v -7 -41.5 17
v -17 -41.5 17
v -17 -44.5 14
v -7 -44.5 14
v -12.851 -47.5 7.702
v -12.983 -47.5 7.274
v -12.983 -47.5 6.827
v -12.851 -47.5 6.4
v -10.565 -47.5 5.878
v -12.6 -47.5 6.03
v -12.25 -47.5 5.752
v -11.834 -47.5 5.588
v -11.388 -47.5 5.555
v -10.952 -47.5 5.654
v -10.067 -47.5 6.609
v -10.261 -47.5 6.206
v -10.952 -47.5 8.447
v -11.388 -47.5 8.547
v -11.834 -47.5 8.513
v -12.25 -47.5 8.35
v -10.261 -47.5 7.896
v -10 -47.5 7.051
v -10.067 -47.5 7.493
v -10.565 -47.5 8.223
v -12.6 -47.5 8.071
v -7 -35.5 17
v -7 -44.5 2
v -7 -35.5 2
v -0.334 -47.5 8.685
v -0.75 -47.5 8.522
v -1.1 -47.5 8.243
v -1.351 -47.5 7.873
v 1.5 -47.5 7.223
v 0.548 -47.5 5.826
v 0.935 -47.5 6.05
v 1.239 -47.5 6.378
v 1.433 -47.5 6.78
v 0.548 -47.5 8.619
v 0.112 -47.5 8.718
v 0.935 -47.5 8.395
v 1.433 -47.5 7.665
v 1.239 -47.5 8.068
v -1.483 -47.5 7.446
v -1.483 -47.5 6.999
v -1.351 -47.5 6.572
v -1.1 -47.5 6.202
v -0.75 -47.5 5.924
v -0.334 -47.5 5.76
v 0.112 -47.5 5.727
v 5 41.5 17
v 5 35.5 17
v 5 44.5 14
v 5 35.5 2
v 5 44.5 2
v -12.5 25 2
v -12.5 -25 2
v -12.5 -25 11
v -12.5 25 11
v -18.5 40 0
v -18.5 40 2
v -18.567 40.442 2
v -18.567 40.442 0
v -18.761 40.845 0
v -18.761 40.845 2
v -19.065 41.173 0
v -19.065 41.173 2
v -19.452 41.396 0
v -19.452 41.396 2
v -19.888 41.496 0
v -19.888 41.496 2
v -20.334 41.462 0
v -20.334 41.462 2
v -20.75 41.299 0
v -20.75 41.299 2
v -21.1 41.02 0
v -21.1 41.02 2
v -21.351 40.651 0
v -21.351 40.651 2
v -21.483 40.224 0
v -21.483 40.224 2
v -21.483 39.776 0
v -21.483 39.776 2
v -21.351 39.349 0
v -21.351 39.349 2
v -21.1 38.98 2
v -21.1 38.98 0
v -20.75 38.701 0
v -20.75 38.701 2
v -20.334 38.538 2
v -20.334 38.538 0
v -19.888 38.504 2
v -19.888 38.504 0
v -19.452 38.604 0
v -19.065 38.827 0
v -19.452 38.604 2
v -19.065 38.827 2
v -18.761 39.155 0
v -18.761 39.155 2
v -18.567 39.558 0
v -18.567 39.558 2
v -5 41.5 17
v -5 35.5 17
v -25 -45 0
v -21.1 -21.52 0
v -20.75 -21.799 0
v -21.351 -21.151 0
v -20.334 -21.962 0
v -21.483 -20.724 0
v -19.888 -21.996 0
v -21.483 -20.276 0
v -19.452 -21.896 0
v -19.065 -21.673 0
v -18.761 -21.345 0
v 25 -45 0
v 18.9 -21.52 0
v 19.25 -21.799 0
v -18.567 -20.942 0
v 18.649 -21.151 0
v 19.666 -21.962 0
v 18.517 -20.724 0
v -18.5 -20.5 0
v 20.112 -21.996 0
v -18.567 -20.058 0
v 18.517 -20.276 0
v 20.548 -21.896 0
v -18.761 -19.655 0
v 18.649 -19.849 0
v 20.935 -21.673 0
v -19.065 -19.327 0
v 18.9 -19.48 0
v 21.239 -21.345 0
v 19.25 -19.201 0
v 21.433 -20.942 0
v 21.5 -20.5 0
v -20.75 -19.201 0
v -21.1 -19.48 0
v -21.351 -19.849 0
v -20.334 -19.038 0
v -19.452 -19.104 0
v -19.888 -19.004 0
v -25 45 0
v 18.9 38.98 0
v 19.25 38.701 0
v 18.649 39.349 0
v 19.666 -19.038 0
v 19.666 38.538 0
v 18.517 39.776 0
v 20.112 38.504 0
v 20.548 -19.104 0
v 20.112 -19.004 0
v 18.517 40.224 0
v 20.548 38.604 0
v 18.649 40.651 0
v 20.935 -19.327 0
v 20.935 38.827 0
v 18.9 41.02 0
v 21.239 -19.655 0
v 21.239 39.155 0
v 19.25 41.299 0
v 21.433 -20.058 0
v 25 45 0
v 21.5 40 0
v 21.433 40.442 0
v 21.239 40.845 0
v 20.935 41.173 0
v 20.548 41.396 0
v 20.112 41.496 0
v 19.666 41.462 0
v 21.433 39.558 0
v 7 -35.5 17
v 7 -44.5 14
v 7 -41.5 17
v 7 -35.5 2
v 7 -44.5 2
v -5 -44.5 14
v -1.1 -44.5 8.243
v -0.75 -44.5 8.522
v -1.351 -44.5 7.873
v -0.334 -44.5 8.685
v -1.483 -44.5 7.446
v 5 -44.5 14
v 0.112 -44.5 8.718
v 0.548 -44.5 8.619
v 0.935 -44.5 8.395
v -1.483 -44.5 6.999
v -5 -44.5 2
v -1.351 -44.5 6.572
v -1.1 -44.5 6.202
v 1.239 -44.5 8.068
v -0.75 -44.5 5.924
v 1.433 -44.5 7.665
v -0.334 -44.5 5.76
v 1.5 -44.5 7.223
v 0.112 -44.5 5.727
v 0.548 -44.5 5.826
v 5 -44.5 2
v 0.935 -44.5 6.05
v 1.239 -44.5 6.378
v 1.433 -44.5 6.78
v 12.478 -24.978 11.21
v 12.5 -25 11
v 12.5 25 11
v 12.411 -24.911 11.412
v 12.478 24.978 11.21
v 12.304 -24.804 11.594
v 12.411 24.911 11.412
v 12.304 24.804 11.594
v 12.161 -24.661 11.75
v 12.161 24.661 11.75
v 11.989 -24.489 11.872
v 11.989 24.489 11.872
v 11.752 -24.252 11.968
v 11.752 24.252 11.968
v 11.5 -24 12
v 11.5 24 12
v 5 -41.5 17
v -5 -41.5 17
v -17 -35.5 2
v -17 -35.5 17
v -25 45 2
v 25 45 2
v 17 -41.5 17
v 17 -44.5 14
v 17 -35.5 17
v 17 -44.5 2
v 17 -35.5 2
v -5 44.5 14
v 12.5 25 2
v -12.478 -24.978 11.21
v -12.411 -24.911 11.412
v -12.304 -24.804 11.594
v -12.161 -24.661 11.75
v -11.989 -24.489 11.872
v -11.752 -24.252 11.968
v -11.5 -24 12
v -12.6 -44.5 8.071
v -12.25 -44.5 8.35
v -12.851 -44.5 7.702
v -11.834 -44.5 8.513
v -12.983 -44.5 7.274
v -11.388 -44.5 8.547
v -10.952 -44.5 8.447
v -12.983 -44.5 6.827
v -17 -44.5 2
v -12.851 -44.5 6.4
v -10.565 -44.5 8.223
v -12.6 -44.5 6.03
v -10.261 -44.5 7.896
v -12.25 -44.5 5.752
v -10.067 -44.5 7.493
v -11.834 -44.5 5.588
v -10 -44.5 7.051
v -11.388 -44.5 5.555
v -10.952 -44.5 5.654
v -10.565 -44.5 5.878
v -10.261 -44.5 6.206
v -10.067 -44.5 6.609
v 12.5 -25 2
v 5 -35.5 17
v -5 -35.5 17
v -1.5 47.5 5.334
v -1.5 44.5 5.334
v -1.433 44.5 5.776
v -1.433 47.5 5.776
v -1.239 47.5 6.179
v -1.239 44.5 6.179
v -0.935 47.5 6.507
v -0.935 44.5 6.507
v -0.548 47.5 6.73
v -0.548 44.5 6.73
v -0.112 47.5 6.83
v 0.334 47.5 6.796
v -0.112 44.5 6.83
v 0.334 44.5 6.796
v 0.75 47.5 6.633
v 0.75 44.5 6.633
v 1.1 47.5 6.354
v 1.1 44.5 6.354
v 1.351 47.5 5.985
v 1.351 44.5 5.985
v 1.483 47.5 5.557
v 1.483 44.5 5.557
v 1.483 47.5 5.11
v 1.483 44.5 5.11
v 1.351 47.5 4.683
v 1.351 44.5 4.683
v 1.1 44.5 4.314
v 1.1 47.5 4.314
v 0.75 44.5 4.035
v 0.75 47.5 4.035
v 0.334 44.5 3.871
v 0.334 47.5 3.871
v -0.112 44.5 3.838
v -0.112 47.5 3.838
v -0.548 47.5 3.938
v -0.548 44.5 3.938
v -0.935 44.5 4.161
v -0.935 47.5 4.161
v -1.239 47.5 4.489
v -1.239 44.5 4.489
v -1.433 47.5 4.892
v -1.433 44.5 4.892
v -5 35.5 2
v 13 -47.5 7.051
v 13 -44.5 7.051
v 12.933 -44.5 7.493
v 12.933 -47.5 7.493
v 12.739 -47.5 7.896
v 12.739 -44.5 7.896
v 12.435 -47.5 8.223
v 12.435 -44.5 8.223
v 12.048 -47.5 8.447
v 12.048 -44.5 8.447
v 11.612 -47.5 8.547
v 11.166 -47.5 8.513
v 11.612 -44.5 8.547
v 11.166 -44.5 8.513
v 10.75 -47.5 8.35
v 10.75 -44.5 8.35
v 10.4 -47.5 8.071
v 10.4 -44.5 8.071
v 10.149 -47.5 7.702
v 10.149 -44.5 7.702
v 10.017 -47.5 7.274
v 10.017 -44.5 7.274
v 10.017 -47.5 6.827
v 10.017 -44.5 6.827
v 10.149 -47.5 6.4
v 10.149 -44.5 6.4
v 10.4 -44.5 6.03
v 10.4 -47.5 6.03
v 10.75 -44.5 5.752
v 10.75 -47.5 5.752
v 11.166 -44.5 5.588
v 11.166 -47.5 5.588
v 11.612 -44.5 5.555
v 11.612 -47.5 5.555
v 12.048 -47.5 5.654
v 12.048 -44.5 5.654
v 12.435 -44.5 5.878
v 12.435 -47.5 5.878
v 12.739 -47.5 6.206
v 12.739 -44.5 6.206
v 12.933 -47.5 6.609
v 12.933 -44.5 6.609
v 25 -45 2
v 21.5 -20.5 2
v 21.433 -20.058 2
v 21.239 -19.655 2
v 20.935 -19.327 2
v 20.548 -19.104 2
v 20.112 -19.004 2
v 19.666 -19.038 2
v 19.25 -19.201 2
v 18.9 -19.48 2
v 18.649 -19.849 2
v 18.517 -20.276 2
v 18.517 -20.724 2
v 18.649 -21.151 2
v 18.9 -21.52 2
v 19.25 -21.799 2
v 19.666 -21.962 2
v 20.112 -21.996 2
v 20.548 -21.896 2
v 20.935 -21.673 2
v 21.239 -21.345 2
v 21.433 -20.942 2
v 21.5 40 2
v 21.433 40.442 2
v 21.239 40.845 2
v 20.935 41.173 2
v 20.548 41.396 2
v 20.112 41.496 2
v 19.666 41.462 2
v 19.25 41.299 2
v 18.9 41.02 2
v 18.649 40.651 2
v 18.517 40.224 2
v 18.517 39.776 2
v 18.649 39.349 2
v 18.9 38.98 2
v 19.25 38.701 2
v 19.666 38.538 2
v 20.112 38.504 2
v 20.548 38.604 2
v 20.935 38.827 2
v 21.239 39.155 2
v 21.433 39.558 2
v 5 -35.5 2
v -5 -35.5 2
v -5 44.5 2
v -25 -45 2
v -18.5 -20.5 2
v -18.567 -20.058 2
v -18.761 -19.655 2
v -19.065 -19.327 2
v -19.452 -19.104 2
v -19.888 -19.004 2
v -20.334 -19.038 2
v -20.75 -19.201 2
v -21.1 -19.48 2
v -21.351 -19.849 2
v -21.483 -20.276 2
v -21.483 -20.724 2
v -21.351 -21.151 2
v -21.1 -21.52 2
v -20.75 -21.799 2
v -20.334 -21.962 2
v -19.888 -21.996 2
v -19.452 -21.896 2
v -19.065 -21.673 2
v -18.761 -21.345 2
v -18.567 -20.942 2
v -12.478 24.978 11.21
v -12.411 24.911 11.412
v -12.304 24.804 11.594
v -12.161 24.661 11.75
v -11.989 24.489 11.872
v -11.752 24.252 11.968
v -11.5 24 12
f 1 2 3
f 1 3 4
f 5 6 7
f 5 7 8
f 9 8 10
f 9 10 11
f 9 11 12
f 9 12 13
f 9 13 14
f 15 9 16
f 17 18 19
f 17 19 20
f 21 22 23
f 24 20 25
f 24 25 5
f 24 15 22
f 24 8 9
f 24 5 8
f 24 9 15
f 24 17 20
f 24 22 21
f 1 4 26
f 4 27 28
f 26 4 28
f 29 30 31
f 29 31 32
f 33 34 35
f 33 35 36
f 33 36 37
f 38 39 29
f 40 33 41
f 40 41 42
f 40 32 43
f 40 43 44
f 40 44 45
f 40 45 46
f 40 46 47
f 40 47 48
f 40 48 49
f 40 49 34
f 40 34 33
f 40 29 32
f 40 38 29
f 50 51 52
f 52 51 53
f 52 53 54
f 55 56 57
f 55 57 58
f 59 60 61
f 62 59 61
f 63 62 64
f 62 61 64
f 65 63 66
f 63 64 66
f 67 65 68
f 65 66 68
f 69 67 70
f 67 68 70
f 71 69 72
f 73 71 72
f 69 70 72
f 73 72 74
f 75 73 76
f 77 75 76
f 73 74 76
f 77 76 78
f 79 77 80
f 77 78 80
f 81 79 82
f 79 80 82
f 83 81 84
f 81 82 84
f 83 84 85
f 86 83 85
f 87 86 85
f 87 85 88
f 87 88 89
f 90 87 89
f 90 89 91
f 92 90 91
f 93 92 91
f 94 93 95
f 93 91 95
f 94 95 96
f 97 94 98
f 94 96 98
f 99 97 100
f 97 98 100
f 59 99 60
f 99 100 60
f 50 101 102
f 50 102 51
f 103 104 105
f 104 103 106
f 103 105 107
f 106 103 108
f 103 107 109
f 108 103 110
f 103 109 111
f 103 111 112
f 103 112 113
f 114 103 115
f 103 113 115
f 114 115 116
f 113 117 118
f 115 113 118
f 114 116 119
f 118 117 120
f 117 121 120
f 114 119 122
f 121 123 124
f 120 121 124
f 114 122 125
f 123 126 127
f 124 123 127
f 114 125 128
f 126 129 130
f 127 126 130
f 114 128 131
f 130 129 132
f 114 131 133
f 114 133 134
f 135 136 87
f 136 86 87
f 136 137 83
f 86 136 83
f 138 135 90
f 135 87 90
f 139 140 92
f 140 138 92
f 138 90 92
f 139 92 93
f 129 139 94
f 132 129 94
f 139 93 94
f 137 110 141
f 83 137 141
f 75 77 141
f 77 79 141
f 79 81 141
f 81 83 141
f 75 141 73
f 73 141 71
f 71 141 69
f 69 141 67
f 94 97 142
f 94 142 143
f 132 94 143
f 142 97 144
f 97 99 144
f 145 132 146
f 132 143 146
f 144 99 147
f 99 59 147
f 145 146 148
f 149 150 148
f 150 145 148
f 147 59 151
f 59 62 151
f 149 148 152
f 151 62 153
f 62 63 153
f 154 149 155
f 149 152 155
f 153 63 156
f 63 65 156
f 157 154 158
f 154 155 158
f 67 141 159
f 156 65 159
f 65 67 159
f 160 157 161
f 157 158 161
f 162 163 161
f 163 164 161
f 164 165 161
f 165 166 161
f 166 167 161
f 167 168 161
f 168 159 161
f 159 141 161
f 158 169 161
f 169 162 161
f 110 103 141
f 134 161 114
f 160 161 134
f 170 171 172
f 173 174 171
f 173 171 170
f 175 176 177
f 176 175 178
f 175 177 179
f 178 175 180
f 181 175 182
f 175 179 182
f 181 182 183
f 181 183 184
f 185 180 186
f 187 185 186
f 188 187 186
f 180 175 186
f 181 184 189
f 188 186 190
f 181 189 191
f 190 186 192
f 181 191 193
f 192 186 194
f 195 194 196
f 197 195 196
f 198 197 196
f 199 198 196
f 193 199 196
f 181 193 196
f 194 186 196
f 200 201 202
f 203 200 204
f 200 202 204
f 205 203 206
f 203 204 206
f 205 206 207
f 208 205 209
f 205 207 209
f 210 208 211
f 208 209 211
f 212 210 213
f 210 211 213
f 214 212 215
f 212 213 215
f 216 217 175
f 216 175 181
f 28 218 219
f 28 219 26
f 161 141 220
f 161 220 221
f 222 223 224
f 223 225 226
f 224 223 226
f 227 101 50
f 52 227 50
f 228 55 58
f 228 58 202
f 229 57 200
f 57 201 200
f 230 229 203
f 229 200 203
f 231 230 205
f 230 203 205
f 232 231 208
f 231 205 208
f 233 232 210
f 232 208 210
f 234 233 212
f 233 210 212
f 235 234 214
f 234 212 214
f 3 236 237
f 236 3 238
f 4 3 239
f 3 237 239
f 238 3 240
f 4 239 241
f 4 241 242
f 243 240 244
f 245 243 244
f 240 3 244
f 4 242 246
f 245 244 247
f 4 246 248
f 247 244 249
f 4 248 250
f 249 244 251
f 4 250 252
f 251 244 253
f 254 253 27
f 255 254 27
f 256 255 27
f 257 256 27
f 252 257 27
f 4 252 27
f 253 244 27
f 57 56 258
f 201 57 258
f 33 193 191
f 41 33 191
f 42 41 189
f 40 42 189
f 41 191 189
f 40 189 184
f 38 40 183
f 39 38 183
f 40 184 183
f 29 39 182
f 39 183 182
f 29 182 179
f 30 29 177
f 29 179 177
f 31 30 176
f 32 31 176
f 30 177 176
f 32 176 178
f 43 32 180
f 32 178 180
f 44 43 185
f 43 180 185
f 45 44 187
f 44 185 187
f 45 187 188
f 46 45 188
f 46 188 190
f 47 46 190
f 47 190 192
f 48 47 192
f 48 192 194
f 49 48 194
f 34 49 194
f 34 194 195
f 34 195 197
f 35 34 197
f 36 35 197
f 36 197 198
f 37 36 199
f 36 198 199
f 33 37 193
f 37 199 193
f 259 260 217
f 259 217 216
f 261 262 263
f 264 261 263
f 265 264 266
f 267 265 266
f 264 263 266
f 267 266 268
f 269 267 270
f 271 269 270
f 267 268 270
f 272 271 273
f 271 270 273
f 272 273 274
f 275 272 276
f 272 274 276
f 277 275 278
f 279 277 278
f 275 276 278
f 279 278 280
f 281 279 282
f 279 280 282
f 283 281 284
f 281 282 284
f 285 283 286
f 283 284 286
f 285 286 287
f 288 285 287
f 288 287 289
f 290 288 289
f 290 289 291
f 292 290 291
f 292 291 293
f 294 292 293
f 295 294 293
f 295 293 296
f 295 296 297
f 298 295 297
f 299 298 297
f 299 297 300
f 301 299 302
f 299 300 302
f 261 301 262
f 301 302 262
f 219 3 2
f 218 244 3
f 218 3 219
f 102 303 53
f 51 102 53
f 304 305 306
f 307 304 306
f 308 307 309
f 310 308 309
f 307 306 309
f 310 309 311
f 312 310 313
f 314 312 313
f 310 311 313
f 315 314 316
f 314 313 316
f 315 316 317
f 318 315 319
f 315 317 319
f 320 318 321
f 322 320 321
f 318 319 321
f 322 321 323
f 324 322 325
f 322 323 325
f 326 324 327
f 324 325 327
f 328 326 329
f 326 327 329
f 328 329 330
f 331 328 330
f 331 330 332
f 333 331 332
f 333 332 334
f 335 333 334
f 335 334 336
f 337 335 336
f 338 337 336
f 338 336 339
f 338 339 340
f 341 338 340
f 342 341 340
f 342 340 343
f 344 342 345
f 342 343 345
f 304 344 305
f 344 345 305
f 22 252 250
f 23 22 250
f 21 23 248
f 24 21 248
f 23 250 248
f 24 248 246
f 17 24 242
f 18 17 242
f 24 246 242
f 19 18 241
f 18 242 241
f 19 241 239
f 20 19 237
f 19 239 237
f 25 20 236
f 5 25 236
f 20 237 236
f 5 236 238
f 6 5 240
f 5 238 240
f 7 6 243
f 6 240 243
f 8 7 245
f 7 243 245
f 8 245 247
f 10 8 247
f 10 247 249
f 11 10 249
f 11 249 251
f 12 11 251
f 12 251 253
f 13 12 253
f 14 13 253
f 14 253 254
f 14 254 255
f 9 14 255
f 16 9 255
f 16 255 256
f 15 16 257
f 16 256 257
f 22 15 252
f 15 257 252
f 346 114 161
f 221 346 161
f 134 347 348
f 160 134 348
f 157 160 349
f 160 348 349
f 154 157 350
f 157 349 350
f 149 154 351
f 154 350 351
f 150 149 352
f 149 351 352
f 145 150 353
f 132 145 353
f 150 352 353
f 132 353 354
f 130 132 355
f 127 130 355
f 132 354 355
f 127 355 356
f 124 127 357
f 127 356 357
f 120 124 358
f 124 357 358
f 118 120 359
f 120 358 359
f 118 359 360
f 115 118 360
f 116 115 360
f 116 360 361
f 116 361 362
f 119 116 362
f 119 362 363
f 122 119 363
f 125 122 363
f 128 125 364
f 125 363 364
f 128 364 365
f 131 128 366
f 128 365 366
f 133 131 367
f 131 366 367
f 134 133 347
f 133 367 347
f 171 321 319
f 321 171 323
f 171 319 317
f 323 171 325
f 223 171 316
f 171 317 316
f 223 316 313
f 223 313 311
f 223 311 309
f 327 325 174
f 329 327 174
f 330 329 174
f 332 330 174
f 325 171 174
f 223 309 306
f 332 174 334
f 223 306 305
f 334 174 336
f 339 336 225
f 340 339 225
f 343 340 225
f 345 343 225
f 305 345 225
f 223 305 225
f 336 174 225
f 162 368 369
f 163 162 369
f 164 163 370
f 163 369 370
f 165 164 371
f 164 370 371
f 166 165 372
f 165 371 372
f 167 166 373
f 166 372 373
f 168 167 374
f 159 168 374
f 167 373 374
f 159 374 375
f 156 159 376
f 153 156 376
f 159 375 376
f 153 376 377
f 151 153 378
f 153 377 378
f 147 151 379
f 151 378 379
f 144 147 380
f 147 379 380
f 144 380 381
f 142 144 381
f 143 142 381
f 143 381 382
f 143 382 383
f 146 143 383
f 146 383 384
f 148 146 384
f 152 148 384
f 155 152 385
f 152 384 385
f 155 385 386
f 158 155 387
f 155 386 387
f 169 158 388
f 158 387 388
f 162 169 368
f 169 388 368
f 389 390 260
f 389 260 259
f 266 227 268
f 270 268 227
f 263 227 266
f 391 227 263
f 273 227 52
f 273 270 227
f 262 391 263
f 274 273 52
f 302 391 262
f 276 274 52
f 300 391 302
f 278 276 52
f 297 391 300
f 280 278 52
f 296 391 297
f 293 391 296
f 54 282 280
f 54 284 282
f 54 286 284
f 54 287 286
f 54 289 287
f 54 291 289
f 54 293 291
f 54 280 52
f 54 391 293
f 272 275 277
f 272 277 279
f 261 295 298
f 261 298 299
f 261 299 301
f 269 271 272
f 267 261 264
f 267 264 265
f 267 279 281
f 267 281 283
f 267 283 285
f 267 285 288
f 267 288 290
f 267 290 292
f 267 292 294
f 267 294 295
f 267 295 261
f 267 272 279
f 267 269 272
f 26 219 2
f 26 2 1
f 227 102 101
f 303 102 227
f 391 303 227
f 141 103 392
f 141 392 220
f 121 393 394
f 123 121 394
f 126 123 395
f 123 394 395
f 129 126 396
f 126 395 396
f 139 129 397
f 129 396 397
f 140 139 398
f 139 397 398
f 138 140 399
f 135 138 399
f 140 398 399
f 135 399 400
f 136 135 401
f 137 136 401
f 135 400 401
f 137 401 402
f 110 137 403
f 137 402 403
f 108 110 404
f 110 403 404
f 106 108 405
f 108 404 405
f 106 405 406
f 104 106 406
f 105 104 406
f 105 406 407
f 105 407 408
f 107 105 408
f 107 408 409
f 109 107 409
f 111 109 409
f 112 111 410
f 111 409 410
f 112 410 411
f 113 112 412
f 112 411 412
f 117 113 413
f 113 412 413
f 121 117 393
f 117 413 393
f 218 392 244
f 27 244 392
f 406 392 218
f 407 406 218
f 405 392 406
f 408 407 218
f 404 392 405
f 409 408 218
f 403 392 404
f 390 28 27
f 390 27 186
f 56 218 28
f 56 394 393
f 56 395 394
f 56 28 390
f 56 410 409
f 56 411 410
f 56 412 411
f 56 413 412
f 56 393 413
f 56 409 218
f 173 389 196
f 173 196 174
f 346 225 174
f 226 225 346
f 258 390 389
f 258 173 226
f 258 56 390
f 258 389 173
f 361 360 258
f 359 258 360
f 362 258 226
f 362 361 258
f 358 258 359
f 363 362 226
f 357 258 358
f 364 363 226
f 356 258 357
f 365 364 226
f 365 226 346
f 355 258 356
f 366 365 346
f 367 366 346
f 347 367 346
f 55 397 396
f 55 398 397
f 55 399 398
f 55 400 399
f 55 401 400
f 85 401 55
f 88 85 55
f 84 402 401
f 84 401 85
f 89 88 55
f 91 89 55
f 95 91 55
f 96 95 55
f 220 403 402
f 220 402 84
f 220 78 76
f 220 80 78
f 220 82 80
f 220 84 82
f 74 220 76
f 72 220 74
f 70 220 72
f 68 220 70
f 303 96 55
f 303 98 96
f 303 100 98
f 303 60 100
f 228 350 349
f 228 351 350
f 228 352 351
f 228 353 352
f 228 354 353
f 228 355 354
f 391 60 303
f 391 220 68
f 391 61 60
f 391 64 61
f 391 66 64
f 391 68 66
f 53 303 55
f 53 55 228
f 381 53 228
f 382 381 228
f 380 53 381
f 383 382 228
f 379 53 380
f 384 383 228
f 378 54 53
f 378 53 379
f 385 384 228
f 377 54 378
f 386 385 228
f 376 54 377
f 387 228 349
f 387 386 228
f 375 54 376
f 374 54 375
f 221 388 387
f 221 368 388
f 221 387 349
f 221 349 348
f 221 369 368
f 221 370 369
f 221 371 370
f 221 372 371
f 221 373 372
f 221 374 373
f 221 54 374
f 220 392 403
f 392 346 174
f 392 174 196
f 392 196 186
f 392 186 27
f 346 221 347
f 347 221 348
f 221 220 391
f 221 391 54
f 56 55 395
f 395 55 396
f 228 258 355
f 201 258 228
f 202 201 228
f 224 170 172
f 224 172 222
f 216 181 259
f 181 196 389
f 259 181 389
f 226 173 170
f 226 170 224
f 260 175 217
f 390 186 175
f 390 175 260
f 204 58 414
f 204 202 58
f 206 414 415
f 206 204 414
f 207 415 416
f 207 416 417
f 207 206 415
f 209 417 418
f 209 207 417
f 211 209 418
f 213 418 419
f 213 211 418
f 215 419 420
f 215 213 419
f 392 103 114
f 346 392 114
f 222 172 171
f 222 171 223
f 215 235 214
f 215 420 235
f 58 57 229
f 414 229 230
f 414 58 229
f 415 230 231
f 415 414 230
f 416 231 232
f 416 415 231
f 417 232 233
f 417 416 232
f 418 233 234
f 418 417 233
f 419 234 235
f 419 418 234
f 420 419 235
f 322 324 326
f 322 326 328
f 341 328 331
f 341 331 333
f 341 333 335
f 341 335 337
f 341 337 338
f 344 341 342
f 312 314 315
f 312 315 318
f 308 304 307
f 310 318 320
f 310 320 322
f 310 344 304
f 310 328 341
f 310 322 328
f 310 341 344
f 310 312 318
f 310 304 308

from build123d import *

# Parameters (mm, degrees)
F0_W      = 50
F0_H      = 90
F1_DEPTH  = 2
F2_R      = 1.5
F3_DEPTH  = 2
F4_W      = 25
F4_H      = 50
F5_DEPTH  = 10
F6_W      = 10
F6_H      = 9
F7_DEPTH  = 15
F8_R      = 1.5
F9_DEPTH  = 3
F10_R     = 1.5
F11_DEPTH = 3
F12_R     = 1
F13_SIZE  = 3


with BuildPart() as f1:
    # F0 (on Top) → F1 (new body)
    with BuildSketch(Plane.XY):
        Rectangle(F0_W, F0_H)
    extrude(amount=F1_DEPTH)

    # F2 (on face) → F3 (cut, through all)
    with BuildSketch(Plane.XY.offset(2)):
        with Locations((-20, 40)):
            Circle(F2_R)
        with Locations((20, 40)):
            Circle(F2_R)
        with Locations((-20, -20.5)):
            Circle(F2_R)
        with Locations((20, -20.5)):
            Circle(F2_R)
    extrude(amount=-F3_DEPTH, mode=Mode.SUBTRACT)

    # F4 (on face) → F5 (join)
    with BuildSketch(Plane.XY.offset(2)):
        Rectangle(F4_W, F4_H)
    extrude(amount=F5_DEPTH)

    # F6 (on face) → F7 (join)
    with BuildSketch(Plane.XY.offset(2)):
        with Locations((0, -40)):
            Rectangle(F6_W, F6_H)
        with Locations((0, 40)):
            Rectangle(F6_W, F6_H)
        with Locations((12, -40)):
            Rectangle(F6_W, F6_H)
        with Locations((-12, -40)):
            Rectangle(F6_W, F6_H)
    extrude(amount=F7_DEPTH)

    # F8 (on face) → F9 (join)
    with BuildSketch(Plane(origin=(0, 44.5, 0), x_dir=(-1, 0, 0), z_dir=(0, 1, 0))):
        with Locations((0, 5.333886)):
            Circle(F8_R)
    extrude(amount=F9_DEPTH)

    # F10 (on face) → F11 (join)
    with BuildSketch(Plane.XZ.offset(44.5)):
        with Locations((0, 7.222579)):
            Circle(F10_R)
        with Locations((-11.5, 7.050698)):
            Circle(F10_R)
        with Locations((11.5, 7.050698)):
            Circle(F10_R)
    extrude(amount=F11_DEPTH)

    # F12
    f12_edges = [f1.edges().sort_by_distance(p)[0] for p in [
        (0, -25, 12),
        (12.5, 0, 12),
        (0, 25, 12),
        (-12.5, 0, 12),
    ]]
    fillet(f12_edges, radius=F12_R)

    # F13
    f13_edges = [f1.edges().sort_by_distance(p)[0] for p in [
        (-12, -44.5, 17),
        (0, -44.5, 17),
        (12, -44.5, 17),
        (0, 44.5, 17),
    ]]
    chamfer(f13_edges, length=F13_SIZE)


solid = f1.part
